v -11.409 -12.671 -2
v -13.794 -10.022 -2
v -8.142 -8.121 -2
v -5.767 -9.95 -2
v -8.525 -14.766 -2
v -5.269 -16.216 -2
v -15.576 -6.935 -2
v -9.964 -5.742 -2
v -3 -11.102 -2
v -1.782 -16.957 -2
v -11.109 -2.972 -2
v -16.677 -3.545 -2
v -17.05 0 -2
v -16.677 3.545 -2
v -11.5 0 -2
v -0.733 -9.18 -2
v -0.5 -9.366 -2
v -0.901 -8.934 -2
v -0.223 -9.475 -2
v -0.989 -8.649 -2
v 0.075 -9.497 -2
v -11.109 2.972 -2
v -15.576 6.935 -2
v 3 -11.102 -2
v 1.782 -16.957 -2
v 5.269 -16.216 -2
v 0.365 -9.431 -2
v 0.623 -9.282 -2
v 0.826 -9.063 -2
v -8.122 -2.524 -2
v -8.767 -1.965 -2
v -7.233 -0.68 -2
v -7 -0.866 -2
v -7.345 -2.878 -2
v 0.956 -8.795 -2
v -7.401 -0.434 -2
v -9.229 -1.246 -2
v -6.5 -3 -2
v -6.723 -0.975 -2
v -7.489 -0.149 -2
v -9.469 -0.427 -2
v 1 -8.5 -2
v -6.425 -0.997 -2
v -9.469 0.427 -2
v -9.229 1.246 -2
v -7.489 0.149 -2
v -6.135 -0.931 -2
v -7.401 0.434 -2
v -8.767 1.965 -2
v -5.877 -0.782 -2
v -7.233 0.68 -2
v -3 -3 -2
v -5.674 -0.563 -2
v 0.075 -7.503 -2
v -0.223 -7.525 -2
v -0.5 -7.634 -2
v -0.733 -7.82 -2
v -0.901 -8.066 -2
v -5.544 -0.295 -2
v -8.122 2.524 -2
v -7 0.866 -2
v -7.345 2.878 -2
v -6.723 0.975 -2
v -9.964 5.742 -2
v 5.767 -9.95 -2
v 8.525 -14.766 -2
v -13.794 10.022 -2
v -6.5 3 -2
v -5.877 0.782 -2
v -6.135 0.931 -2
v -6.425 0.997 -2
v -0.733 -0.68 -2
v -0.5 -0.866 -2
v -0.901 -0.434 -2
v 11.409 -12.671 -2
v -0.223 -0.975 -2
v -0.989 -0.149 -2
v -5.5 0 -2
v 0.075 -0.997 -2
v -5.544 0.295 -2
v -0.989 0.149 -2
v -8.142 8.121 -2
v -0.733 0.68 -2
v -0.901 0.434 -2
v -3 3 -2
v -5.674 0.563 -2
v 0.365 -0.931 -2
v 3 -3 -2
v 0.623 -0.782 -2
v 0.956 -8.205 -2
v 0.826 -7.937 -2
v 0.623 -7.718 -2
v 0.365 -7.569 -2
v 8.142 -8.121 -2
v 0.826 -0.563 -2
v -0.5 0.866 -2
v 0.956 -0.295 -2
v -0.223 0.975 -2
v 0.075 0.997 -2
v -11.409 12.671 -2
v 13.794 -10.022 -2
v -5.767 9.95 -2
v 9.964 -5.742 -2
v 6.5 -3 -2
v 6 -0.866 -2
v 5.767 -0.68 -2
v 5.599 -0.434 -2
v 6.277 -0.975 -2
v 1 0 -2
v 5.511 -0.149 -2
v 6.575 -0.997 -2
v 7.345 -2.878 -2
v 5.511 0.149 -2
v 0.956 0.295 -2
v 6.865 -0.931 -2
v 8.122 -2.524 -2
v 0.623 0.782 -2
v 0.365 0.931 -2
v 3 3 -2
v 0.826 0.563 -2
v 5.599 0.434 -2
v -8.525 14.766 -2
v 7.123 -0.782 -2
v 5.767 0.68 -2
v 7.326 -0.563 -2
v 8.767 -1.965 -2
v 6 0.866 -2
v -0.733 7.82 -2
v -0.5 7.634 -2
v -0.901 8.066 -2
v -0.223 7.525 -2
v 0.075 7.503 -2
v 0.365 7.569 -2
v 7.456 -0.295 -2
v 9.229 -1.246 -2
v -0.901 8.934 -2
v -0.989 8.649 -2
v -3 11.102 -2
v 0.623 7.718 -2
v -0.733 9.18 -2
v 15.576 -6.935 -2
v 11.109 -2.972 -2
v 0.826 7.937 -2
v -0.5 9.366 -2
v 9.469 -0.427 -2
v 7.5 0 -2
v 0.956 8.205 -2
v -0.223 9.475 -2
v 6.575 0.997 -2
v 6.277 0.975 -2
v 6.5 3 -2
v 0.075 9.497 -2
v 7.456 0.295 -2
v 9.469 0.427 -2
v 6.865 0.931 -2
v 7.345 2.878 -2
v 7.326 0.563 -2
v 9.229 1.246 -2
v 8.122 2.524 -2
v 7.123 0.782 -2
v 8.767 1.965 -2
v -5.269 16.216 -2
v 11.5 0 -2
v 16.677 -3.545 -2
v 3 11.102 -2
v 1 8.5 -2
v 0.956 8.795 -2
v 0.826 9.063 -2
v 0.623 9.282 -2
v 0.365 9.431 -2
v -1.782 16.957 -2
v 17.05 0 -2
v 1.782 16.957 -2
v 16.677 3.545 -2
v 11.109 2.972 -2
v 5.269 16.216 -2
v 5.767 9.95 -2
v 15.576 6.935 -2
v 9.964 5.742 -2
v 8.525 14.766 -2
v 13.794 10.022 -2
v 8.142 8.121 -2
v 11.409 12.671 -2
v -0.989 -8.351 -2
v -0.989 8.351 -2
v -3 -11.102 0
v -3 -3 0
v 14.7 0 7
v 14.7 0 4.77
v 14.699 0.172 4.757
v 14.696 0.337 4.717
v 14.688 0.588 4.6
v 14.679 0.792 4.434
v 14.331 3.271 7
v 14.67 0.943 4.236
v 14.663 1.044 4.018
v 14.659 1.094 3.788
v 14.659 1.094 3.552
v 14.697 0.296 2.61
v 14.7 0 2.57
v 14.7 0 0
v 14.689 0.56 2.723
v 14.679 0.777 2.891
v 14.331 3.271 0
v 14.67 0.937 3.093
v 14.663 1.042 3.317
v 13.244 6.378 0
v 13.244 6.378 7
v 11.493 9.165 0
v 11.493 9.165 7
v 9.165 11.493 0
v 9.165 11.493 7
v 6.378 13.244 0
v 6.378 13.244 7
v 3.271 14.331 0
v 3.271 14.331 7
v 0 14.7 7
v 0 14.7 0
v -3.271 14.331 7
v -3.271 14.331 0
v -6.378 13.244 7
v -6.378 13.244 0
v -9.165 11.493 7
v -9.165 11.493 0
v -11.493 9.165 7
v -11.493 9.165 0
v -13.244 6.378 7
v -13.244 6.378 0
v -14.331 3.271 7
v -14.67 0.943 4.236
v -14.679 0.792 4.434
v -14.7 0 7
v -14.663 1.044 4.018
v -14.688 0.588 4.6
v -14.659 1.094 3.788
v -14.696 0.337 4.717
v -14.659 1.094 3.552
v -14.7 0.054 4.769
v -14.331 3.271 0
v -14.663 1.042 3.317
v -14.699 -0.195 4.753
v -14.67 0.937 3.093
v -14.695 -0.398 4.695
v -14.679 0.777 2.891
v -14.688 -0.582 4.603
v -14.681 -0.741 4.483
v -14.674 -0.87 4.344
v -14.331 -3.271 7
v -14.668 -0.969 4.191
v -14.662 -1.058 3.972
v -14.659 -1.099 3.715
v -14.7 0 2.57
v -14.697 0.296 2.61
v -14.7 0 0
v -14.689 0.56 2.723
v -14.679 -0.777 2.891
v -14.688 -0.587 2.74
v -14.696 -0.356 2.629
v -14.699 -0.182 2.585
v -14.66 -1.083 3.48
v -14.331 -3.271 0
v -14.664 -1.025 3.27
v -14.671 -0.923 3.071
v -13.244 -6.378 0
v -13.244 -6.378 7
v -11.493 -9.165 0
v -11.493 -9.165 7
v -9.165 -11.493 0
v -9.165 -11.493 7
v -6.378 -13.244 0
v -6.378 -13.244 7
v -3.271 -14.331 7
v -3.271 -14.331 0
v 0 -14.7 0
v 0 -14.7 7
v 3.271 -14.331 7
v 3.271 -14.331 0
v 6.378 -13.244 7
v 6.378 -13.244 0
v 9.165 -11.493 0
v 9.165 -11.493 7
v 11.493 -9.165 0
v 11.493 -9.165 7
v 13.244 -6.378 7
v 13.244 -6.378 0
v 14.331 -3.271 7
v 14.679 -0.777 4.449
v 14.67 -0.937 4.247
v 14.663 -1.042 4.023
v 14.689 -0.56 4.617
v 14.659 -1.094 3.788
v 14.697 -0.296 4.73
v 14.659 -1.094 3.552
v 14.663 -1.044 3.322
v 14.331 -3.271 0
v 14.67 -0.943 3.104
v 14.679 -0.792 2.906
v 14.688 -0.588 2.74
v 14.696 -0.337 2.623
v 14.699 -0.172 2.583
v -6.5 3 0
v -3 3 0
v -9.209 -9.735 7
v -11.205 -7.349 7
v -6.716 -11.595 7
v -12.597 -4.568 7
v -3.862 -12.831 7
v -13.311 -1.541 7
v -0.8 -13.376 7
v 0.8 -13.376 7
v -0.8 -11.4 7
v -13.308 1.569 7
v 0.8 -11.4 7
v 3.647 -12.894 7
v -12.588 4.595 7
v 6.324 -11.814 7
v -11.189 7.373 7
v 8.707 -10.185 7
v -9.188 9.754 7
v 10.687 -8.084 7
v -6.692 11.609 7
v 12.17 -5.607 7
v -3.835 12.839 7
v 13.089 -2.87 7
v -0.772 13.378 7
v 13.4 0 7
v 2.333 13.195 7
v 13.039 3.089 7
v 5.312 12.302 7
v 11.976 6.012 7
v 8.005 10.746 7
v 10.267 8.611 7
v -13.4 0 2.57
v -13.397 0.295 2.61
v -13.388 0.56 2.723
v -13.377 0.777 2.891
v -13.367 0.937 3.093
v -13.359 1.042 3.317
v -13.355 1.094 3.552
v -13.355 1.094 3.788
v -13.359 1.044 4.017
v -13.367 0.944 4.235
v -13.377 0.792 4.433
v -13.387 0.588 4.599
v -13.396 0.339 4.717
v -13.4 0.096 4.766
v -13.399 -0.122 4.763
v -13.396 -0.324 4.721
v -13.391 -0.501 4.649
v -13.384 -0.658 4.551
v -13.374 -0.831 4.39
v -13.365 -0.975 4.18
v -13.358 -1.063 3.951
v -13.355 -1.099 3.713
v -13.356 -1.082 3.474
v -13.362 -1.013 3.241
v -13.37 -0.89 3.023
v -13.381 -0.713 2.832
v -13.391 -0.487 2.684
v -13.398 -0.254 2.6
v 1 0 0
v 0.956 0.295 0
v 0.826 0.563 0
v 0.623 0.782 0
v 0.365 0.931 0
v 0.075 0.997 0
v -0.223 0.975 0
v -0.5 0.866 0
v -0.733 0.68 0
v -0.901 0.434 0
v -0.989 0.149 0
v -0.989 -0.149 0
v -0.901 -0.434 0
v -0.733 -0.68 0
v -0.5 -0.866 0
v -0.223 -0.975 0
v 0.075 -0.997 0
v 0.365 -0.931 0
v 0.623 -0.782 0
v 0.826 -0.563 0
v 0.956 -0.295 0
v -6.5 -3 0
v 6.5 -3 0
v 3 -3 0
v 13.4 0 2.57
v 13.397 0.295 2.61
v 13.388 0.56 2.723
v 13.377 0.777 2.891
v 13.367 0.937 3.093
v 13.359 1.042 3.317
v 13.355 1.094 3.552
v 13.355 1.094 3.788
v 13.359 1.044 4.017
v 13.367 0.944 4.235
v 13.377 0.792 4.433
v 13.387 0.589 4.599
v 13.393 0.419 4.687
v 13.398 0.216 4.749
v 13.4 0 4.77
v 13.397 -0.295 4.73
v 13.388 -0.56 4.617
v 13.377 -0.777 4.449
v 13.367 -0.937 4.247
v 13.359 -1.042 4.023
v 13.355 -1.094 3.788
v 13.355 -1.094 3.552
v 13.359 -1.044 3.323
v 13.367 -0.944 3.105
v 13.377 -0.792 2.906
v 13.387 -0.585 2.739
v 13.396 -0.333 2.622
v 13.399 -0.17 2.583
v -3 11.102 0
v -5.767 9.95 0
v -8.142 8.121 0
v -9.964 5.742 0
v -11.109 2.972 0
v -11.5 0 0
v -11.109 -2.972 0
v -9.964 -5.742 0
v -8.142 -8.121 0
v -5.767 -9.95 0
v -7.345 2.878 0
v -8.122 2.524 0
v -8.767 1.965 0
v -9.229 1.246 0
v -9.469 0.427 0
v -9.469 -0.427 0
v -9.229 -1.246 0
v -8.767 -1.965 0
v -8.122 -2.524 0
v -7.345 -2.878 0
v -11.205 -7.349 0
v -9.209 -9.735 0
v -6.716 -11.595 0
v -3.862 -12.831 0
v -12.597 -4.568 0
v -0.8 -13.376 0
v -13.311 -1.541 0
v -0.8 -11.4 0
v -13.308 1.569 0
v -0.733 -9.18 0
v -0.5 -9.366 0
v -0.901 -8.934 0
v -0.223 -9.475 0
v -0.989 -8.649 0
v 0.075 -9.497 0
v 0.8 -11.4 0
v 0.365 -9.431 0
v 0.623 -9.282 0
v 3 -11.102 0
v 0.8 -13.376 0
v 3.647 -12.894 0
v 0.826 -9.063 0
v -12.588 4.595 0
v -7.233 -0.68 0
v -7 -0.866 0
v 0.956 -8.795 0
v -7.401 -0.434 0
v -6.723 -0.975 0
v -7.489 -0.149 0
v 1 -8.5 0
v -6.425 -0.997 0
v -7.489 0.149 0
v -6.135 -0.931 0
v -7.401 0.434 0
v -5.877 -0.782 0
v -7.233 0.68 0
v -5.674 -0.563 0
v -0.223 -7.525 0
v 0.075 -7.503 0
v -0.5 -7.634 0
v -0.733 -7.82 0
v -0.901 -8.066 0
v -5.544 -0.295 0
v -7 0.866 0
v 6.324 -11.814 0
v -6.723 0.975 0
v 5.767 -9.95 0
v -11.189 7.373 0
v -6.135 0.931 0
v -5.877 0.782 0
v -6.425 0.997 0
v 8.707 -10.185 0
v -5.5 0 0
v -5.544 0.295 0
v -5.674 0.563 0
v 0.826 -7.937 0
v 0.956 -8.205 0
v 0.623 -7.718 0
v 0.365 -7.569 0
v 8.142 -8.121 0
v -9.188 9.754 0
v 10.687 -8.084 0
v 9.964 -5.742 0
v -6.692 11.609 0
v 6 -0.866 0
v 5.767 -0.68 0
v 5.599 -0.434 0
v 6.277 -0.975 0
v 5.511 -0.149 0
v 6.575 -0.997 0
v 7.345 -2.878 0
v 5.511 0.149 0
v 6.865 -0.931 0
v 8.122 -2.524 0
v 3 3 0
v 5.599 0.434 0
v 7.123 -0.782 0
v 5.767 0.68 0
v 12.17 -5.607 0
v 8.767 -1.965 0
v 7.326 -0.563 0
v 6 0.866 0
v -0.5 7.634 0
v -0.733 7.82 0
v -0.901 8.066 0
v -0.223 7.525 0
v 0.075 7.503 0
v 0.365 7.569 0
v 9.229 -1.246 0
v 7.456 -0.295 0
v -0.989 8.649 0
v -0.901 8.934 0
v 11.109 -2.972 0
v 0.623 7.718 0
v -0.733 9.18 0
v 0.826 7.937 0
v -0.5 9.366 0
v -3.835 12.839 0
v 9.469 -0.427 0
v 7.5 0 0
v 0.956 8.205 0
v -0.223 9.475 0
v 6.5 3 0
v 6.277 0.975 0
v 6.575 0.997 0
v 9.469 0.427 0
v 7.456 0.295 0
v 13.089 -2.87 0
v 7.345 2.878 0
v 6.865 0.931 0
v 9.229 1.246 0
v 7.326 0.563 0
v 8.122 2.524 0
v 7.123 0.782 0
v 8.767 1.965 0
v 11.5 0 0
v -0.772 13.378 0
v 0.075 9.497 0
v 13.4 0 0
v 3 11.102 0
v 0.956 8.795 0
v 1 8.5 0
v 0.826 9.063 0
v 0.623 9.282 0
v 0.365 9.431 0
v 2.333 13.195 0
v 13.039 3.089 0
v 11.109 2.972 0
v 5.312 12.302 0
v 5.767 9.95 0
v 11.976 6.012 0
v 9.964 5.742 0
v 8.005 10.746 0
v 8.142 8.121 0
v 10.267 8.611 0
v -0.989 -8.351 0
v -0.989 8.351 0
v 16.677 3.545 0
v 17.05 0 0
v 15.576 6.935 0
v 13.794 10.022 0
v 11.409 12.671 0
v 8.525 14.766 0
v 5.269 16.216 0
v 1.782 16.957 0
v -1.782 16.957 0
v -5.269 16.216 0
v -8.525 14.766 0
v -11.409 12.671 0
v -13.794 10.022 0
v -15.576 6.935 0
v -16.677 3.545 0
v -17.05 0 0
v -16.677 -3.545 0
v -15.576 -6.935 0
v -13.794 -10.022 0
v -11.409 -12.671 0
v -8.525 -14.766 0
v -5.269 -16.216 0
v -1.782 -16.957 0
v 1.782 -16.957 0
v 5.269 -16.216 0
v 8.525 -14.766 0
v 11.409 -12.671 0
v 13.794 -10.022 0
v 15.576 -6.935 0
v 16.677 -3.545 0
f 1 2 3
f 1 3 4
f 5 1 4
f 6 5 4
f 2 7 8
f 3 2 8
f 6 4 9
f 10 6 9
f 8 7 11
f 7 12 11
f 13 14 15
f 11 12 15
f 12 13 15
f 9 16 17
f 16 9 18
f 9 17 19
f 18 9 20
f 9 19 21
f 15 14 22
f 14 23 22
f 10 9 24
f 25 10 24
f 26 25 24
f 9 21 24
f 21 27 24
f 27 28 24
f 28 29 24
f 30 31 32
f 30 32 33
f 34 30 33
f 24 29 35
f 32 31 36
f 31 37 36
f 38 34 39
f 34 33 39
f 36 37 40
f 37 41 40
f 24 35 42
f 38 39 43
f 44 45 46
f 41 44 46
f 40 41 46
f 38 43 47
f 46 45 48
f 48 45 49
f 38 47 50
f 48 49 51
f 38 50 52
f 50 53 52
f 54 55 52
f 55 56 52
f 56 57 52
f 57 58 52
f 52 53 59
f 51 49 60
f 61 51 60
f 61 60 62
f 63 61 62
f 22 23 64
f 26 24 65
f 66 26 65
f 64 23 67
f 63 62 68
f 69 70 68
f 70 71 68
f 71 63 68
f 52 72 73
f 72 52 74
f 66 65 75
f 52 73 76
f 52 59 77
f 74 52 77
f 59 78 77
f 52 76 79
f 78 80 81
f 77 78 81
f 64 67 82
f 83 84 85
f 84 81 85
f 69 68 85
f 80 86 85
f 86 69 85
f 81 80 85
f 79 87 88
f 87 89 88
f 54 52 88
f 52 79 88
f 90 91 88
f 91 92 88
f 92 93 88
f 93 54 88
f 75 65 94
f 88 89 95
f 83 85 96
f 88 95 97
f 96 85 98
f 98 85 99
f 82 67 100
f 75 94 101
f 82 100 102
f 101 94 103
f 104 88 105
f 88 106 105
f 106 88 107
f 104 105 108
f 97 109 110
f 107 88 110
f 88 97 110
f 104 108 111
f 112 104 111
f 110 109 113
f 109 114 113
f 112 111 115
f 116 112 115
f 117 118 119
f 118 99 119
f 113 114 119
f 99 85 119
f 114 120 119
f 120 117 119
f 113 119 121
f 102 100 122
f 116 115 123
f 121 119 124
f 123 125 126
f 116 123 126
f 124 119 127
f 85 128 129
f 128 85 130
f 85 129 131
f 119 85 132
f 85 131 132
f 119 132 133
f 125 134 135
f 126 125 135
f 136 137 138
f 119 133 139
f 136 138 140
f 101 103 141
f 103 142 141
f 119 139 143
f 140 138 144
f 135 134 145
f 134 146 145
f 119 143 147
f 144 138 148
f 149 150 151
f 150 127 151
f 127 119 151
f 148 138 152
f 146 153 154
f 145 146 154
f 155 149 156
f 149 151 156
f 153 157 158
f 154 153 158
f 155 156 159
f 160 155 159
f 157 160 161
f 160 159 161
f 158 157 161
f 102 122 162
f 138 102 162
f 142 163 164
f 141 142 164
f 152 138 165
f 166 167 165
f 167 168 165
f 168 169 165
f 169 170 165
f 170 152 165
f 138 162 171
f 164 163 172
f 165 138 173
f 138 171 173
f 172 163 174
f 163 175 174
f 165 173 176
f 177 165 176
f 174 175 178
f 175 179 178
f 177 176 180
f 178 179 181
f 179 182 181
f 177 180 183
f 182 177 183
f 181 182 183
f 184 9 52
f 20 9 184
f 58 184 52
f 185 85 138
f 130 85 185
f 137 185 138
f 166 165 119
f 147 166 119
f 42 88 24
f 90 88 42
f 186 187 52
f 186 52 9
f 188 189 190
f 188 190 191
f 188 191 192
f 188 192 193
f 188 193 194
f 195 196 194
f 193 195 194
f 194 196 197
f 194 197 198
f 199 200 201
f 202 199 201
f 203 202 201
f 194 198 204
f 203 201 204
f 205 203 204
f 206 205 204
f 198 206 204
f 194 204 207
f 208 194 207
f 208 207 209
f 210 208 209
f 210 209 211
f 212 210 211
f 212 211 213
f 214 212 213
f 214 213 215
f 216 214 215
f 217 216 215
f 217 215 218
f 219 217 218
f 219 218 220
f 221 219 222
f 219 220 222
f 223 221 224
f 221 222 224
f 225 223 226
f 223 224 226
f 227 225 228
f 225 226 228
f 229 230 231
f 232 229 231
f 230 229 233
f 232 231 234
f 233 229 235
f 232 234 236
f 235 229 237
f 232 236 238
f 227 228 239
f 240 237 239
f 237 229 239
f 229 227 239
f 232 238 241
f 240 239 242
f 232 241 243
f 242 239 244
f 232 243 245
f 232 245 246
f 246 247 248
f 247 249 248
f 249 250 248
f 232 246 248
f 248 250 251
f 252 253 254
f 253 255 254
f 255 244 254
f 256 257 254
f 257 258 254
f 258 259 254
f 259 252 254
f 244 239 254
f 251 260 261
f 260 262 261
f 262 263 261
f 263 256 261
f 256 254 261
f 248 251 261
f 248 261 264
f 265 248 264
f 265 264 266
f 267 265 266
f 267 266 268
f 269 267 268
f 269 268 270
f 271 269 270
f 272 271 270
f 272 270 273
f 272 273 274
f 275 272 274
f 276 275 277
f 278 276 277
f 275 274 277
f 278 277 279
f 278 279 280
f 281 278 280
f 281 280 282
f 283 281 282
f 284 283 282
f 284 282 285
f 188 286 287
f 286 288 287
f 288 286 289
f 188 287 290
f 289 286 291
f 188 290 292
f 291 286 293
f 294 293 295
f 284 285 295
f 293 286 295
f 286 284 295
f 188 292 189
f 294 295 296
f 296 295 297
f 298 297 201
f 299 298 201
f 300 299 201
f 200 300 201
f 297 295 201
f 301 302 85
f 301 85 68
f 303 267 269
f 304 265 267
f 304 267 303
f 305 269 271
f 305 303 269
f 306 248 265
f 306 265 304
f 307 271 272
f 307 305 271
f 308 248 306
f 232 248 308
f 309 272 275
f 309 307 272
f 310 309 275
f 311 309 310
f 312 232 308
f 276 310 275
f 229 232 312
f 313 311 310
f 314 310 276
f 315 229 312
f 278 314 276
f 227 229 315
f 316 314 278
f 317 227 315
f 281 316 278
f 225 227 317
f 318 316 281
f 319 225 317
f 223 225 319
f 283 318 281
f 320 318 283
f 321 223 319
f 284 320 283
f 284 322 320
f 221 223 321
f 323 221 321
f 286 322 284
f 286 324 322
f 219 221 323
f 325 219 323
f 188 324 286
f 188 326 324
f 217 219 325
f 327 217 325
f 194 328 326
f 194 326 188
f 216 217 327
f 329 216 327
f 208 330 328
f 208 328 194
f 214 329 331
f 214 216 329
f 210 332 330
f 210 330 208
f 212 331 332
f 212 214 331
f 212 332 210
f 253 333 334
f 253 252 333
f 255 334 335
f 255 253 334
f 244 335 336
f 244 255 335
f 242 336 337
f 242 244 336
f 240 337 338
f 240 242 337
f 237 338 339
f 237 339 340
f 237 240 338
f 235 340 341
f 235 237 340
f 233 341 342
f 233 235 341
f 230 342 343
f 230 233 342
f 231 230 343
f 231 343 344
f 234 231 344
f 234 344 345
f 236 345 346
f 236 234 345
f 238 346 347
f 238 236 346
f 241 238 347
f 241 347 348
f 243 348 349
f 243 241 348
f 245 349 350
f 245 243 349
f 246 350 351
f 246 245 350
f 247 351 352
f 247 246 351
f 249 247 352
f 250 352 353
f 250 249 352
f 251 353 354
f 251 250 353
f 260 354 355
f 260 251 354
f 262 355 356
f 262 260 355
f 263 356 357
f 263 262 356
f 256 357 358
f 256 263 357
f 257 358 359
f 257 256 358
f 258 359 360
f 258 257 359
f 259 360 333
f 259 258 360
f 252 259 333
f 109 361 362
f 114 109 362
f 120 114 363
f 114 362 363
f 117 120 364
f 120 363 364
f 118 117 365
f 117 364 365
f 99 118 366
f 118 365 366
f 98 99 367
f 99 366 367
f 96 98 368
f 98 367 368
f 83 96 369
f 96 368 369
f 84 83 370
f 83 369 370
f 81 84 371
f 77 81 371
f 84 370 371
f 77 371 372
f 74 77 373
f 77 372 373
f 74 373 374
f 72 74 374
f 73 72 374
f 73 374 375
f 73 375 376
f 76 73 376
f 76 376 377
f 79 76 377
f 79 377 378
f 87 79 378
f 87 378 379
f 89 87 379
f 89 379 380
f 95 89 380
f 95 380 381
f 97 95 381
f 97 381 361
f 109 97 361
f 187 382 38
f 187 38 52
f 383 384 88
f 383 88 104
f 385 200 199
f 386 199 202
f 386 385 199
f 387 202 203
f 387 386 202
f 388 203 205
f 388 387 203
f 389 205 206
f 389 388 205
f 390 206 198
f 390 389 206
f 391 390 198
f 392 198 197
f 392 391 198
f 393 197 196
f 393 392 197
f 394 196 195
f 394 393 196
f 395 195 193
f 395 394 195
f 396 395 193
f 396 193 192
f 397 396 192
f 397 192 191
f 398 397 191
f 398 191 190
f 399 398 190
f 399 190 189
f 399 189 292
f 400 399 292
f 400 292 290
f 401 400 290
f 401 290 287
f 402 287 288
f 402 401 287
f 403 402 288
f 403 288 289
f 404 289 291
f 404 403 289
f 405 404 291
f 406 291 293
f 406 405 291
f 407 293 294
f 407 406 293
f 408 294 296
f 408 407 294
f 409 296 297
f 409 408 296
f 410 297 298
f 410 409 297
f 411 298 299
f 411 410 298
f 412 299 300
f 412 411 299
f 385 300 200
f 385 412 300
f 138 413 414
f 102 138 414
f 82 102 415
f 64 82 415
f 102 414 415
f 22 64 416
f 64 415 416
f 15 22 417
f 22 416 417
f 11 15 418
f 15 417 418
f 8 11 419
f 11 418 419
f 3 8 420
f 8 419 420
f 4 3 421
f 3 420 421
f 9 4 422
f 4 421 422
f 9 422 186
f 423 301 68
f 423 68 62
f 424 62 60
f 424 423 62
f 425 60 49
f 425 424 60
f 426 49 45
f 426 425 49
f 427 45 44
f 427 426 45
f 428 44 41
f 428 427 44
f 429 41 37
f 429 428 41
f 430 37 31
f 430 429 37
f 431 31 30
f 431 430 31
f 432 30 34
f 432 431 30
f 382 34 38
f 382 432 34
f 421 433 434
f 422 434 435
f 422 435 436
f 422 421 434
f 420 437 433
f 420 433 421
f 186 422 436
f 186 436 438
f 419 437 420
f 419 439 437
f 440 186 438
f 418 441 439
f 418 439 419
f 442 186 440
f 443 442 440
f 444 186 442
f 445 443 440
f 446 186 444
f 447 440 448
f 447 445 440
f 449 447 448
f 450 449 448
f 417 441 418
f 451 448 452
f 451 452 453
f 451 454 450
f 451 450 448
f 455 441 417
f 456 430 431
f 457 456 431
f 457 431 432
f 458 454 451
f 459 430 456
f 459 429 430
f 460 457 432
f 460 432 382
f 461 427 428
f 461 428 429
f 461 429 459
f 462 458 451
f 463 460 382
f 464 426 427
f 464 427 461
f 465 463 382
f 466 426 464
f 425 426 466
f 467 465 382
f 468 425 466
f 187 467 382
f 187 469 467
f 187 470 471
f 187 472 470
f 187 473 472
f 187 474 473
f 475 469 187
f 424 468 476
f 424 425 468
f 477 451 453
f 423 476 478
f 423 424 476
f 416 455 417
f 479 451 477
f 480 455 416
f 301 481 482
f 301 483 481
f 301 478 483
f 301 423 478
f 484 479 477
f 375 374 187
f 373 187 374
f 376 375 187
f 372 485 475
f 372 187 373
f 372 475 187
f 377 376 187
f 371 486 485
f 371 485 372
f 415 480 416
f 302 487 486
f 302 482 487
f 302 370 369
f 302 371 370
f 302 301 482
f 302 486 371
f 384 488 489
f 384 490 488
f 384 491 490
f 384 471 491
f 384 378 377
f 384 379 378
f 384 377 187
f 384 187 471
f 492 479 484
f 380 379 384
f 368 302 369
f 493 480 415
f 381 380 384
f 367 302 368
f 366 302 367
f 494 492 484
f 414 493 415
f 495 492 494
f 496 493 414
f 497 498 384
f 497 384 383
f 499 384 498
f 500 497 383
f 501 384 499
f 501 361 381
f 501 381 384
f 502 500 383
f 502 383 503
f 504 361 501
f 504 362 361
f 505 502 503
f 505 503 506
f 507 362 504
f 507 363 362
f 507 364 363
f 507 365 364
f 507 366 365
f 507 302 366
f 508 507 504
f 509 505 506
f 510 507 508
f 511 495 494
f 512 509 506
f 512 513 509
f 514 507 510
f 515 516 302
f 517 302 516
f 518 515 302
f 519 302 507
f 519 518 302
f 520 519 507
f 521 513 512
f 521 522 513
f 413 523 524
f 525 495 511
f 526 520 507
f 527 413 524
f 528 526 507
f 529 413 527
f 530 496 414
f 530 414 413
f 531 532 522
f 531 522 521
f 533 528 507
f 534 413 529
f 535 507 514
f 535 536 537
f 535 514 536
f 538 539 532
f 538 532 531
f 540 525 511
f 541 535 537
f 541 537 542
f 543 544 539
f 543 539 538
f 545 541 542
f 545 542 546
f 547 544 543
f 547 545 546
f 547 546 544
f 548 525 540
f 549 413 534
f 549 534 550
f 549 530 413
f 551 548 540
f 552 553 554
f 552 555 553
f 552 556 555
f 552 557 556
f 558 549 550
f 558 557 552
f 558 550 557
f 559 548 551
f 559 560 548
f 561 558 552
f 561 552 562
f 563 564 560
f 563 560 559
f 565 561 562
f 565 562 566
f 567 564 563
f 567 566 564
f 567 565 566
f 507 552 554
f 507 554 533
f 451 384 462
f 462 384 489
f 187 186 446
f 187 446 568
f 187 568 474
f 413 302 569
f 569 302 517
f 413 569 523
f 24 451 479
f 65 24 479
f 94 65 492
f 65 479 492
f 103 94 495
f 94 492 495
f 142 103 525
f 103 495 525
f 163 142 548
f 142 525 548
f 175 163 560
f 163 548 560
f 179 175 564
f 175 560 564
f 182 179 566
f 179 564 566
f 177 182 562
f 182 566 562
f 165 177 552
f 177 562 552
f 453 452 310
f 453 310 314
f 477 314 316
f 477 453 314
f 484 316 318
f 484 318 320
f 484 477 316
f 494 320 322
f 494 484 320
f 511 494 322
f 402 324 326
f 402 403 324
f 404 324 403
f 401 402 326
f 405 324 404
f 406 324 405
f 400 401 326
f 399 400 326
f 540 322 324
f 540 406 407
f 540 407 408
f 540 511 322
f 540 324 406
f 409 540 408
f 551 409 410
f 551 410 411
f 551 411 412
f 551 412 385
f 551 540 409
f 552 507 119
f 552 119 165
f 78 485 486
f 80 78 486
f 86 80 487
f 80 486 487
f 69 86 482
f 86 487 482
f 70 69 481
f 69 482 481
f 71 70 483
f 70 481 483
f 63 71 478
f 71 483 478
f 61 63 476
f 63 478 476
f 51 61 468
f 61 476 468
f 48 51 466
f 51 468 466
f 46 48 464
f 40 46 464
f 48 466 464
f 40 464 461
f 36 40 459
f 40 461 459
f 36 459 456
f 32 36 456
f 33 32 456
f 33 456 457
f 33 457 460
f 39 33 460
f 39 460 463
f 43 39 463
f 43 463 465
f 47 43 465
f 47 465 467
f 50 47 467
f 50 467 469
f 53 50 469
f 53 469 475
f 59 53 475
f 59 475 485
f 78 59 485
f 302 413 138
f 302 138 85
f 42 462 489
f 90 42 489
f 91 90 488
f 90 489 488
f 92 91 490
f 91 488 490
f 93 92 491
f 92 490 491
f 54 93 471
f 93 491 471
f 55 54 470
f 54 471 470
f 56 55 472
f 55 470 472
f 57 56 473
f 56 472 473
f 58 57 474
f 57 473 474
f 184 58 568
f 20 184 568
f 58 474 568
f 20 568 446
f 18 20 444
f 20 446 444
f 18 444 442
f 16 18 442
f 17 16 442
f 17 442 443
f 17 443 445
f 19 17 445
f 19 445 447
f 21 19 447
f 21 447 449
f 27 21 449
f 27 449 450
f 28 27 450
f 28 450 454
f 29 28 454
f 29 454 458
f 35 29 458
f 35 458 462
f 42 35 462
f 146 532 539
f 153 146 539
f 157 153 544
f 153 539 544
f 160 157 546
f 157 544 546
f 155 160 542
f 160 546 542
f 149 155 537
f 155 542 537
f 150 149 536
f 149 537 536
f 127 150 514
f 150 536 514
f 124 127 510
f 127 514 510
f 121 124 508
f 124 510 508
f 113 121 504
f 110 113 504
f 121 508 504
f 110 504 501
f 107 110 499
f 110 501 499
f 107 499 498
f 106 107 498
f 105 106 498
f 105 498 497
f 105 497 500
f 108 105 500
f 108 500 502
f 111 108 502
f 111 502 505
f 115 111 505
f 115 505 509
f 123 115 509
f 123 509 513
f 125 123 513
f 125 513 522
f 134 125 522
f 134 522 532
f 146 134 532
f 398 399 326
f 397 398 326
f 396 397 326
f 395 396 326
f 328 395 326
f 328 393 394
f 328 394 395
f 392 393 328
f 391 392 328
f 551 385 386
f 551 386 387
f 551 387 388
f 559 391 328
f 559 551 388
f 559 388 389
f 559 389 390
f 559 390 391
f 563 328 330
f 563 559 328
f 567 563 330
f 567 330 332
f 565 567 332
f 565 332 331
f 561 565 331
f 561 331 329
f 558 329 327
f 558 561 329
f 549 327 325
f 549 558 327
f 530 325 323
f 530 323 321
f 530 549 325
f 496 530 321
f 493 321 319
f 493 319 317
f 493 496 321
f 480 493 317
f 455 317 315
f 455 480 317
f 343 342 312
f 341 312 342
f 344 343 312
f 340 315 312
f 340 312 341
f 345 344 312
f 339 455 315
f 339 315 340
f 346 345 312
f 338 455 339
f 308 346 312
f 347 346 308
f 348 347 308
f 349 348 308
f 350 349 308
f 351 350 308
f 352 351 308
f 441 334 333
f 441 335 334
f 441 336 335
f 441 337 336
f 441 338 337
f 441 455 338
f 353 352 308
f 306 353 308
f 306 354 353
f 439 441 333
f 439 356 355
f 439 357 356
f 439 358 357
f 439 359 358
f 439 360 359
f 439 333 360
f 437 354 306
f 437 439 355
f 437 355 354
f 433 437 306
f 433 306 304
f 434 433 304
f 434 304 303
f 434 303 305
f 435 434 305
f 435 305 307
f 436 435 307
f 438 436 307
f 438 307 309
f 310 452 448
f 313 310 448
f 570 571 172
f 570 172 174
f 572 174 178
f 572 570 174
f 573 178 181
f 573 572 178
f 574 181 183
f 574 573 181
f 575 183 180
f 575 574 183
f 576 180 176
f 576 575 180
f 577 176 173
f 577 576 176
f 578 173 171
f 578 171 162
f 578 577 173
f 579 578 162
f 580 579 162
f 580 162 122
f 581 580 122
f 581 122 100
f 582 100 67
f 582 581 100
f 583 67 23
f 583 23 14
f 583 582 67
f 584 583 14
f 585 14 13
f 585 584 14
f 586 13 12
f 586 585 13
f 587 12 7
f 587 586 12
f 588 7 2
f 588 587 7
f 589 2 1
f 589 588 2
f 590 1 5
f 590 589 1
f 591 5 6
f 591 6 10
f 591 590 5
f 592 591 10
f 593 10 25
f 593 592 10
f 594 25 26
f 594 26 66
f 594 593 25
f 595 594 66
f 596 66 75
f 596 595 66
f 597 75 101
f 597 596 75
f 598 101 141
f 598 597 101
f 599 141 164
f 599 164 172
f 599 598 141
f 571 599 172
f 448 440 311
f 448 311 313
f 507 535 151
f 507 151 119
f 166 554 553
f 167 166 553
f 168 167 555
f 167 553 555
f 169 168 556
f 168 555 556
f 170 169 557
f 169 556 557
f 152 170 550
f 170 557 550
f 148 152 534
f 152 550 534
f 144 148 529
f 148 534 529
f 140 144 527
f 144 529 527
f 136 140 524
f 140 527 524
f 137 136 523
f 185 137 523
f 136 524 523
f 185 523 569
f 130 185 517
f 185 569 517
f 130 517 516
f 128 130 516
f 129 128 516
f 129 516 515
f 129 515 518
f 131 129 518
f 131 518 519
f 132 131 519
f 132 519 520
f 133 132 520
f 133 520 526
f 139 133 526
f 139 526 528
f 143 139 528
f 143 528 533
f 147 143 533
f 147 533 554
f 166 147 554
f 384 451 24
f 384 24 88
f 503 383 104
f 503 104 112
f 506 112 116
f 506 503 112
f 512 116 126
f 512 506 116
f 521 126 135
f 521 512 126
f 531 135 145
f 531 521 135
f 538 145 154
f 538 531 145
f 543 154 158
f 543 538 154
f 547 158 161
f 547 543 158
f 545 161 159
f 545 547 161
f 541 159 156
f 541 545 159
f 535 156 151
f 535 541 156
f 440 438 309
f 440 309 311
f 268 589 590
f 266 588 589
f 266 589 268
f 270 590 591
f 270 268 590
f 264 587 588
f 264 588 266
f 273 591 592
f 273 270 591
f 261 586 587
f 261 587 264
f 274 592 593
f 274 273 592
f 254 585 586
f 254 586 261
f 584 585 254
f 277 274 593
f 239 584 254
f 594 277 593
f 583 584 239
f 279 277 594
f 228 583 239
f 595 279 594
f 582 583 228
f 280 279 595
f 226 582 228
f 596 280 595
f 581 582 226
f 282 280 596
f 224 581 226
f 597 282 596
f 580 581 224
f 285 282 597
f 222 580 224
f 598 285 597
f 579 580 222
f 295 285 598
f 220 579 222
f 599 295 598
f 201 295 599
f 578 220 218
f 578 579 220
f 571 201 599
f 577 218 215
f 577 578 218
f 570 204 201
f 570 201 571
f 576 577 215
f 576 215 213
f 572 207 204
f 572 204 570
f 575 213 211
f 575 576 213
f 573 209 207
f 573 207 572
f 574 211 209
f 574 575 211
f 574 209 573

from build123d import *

# Parameters (mm, degrees)
SKETCH1_R               = 14.7
SKETCH1_R_2             = 13.4
BOSS_EXTRUDE1_DEPTH     = 7
SKETCH2_W               = 1.6
SKETCH2_H               = 2
BOSS_EXTRUDE2_DEPTH     = 7
CUT_EXTRUDE1_DEPTH      = 22.935815462
CUT_EXTRUDE1_DEPTH_BACK = 22.935815462
SKETCH3_R               = 1.1
SKETCH4_R               = 17.05
SKETCH4_R_2             = 11.5
BOSS_EXTRUDE3_DEPTH     = 2
BOSS_EXTRUDE4_DEPTH     = 2
CUT_EXTRUDE2_REACH      = 27.108
SKETCH6_R               = 1


with BuildPart() as part:
    # Sketch1 → Boss-Extrude1 (new body)
    with BuildSketch(Plane.XY):
        Circle(SKETCH1_R)
        Circle(SKETCH1_R_2, mode=Mode.SUBTRACT)
    extrude(amount=BOSS_EXTRUDE1_DEPTH)

    # Sketch2 → Boss-Extrude2 (add)
    with BuildSketch(Plane.XY):
        with Locations((0, -12.4)):
            Rectangle(SKETCH2_W, SKETCH2_H)
    extrude(amount=BOSS_EXTRUDE2_DEPTH)

    # Sketch3 → Cut-Extrude1 (cut, two sides: drawn at the far end of the back side and taken through both)
    with BuildSketch(Plane(origin=(0, 0, 0), x_dir=(0, 0, -1), z_dir=(1, 0, 0)).offset(-CUT_EXTRUDE1_DEPTH_BACK)):
        with Locations((-3.67, 0)):
            Circle(SKETCH3_R)
    extrude(amount=CUT_EXTRUDE1_DEPTH + CUT_EXTRUDE1_DEPTH_BACK, mode=Mode.SUBTRACT)

    # Sketch4 → Boss-Extrude3 (add)
    with BuildSketch(Plane.XY):
        Circle(SKETCH4_R)
        Circle(SKETCH4_R_2, mode=Mode.SUBTRACT)
    extrude(amount=-BOSS_EXTRUDE3_DEPTH)

    # Sketch5 → Boss-Extrude4 (add)
    with BuildSketch(Plane.XY):
        with BuildLine():
            Line((-6.5, -3), (-3, -3))
            Line((-3, -3), (-3, -11.5))
            Line((-3, -11.5), (3, -11.5))
            Line((3, -11.5), (3, -3))
            Line((3, -3), (6.5, -3))
            ThreePointArc((6.5, -3), (9.5, 0), (6.5, 3))
            Line((6.5, 3), (3, 3))
            Line((3, 3), (3, 11.5))
            Line((3, 11.5), (0, 11.5))
            Line((0, 11.5), (-3, 11.5))
            Line((-3, 11.5), (-3, 3))
            Line((-3, 3), (-6.5, 3))
            ThreePointArc((-6.5, 3), (-9.5, 0), (-6.5, -3))
        make_face()
    extrude(amount=-BOSS_EXTRUDE4_DEPTH)

    # Sketch6 → Cut-Extrude2 (cut, up to next)
    with BuildSketch(Plane.XY, mode=Mode.PRIVATE) as cut_extrude2_sk1:
        Circle(SKETCH6_R)
    cut_extrude2_tool1 = extrude(cut_extrude2_sk1.sketch, amount=-CUT_EXTRUDE2_REACH, mode=Mode.PRIVATE) & part.part
    # Sketch6 → Cut-Extrude2 (cut, up to next)
    with BuildSketch(Plane.XY, mode=Mode.PRIVATE) as cut_extrude2_sk2:
        with Locations((6.5, 0)):
            Circle(SKETCH6_R)
    cut_extrude2_tool2 = extrude(cut_extrude2_sk2.sketch, amount=-CUT_EXTRUDE2_REACH, mode=Mode.PRIVATE) & part.part
    # Sketch6 → Cut-Extrude2 (cut, up to next)
    with BuildSketch(Plane.XY, mode=Mode.PRIVATE) as cut_extrude2_sk3:
        with Locations((-6.5, 0)):
            Circle(SKETCH6_R)
    cut_extrude2_tool3 = extrude(cut_extrude2_sk3.sketch, amount=-CUT_EXTRUDE2_REACH, mode=Mode.PRIVATE) & part.part
    # Sketch6 → Cut-Extrude2 (cut, up to next)
    with BuildSketch(Plane.XY, mode=Mode.PRIVATE) as cut_extrude2_sk4:
        with Locations((0, 8.5)):
            Circle(SKETCH6_R)
    cut_extrude2_tool4 = extrude(cut_extrude2_sk4.sketch, amount=-CUT_EXTRUDE2_REACH, mode=Mode.PRIVATE) & part.part
    # Sketch6 → Cut-Extrude2 (cut, up to next)
    with BuildSketch(Plane.XY, mode=Mode.PRIVATE) as cut_extrude2_sk5:
        with Locations((0, -8.5)):
            Circle(SKETCH6_R)
    cut_extrude2_tool5 = extrude(cut_extrude2_sk5.sketch, amount=-CUT_EXTRUDE2_REACH, mode=Mode.PRIVATE) & part.part
    add(cut_extrude2_tool1.solids().sort_by_distance((0, 0, 0))[0], mode=Mode.SUBTRACT)
    add(cut_extrude2_tool2.solids().sort_by_distance((6.5, 0, 0))[0], mode=Mode.SUBTRACT)
    add(cut_extrude2_tool3.solids().sort_by_distance((-6.5, 0, 0))[0], mode=Mode.SUBTRACT)
    add(cut_extrude2_tool4.solids().sort_by_distance((0, 8.5, 0))[0], mode=Mode.SUBTRACT)
    add(cut_extrude2_tool5.solids().sort_by_distance((0, -8.5, 0))[0], mode=Mode.SUBTRACT)


solid = part.part
